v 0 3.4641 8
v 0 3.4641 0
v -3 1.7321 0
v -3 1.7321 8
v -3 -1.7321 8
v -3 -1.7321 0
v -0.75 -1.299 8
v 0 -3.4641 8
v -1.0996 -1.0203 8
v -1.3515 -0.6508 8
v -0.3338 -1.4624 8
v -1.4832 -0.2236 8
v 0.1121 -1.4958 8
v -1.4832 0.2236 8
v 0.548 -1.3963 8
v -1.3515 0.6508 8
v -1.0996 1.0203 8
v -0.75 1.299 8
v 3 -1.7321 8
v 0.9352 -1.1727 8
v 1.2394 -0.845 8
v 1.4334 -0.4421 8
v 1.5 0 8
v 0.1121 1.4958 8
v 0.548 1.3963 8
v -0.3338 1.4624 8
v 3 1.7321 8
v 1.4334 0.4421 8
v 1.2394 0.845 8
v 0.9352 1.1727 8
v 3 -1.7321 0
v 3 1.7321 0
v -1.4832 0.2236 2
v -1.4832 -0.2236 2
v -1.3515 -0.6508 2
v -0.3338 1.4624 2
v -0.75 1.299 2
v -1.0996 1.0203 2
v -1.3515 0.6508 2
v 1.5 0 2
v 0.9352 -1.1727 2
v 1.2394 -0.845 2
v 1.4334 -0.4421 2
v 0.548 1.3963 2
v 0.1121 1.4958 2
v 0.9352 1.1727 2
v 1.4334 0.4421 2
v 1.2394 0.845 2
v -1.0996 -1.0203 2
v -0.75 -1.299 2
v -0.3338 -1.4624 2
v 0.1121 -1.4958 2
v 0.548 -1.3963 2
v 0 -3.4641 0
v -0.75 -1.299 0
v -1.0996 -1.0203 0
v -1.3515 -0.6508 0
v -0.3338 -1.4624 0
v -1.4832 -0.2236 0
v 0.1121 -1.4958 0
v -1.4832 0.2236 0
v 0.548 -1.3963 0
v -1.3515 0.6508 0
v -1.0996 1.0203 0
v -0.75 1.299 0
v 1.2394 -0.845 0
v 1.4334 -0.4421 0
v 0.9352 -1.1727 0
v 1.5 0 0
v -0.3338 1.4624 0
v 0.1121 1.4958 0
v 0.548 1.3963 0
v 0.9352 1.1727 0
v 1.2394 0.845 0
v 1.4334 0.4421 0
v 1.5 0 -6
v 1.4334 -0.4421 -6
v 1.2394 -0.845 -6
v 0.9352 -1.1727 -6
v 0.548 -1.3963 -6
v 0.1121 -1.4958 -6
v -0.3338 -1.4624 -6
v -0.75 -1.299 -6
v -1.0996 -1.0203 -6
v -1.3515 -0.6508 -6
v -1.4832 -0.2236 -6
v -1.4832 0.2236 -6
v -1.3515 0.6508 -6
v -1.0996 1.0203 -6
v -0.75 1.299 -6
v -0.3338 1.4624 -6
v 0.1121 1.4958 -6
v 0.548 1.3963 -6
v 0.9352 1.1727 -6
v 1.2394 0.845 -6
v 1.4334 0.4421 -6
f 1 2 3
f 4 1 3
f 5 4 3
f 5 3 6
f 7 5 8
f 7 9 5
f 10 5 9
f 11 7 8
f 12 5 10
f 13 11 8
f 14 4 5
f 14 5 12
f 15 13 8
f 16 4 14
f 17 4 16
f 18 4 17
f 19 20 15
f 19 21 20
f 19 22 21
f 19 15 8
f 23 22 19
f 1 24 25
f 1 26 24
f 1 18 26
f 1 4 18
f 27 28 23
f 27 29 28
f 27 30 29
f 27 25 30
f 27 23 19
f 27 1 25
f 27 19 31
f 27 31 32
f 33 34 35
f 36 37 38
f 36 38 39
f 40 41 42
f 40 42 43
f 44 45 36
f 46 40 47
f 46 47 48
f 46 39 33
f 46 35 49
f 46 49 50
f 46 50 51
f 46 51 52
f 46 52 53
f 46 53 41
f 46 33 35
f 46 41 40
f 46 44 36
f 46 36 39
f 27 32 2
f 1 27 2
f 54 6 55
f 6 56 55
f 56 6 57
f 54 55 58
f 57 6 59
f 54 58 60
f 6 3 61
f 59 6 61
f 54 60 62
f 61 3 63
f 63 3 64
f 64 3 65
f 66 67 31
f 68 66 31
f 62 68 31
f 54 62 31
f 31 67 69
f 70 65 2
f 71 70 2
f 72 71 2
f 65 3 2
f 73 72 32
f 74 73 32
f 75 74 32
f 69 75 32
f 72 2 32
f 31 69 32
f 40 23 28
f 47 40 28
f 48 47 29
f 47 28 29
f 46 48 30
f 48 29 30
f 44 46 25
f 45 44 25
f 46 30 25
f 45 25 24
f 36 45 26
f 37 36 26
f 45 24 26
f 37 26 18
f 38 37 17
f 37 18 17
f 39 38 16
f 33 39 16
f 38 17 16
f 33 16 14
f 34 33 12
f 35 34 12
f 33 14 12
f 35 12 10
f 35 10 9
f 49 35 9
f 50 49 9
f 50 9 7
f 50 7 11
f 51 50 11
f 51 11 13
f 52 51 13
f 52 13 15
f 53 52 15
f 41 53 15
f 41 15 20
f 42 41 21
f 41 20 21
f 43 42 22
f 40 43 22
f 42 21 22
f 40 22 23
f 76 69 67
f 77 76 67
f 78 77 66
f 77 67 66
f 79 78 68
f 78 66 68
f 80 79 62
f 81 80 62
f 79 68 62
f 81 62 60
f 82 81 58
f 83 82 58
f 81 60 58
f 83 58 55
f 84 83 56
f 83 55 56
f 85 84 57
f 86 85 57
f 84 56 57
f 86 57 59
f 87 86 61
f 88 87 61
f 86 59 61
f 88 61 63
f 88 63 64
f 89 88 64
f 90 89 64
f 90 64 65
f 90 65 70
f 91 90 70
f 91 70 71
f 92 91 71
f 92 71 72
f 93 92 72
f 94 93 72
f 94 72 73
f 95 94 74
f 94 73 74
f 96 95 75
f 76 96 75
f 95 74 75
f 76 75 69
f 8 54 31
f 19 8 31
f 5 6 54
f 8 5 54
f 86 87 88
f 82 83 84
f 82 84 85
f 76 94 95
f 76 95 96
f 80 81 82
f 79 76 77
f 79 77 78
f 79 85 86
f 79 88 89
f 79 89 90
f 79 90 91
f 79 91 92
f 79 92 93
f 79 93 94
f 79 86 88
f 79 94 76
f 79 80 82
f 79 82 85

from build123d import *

# Parameters (mm, degrees)
PAD_DEPTH    = 8
SKETCH001_R  = 1.5
PAD001_DEPTH = 6
SKETCH002_R  = 1.5
POCKET_DEPTH = 6


with BuildPart() as part:
    # Sketch → Pad (new body)
    with BuildSketch(Plane.XY):
        Polygon((3, -1.732051), (3, 1.732051), (0, 3.464102), (-3, 1.732051), (-3, -1.732051), (0, -3.464102), align=None)
    extrude(amount=PAD_DEPTH)

    # Sketch001 (on Face7 of Pad) → Pad001 (join)
    with BuildSketch(Plane(origin=(0, 0, 0), x_dir=(1, 0, 0), z_dir=(0, 0, -1))):
        Circle(SKETCH001_R)
    extrude(amount=PAD001_DEPTH)

    # Sketch002 (on Face5 of Pad001) → Pocket (cut)
    with BuildSketch(Plane.XY.offset(8)):
        Circle(SKETCH002_R)
    extrude(amount=-POCKET_DEPTH, mode=Mode.SUBTRACT)


solid = part.part
